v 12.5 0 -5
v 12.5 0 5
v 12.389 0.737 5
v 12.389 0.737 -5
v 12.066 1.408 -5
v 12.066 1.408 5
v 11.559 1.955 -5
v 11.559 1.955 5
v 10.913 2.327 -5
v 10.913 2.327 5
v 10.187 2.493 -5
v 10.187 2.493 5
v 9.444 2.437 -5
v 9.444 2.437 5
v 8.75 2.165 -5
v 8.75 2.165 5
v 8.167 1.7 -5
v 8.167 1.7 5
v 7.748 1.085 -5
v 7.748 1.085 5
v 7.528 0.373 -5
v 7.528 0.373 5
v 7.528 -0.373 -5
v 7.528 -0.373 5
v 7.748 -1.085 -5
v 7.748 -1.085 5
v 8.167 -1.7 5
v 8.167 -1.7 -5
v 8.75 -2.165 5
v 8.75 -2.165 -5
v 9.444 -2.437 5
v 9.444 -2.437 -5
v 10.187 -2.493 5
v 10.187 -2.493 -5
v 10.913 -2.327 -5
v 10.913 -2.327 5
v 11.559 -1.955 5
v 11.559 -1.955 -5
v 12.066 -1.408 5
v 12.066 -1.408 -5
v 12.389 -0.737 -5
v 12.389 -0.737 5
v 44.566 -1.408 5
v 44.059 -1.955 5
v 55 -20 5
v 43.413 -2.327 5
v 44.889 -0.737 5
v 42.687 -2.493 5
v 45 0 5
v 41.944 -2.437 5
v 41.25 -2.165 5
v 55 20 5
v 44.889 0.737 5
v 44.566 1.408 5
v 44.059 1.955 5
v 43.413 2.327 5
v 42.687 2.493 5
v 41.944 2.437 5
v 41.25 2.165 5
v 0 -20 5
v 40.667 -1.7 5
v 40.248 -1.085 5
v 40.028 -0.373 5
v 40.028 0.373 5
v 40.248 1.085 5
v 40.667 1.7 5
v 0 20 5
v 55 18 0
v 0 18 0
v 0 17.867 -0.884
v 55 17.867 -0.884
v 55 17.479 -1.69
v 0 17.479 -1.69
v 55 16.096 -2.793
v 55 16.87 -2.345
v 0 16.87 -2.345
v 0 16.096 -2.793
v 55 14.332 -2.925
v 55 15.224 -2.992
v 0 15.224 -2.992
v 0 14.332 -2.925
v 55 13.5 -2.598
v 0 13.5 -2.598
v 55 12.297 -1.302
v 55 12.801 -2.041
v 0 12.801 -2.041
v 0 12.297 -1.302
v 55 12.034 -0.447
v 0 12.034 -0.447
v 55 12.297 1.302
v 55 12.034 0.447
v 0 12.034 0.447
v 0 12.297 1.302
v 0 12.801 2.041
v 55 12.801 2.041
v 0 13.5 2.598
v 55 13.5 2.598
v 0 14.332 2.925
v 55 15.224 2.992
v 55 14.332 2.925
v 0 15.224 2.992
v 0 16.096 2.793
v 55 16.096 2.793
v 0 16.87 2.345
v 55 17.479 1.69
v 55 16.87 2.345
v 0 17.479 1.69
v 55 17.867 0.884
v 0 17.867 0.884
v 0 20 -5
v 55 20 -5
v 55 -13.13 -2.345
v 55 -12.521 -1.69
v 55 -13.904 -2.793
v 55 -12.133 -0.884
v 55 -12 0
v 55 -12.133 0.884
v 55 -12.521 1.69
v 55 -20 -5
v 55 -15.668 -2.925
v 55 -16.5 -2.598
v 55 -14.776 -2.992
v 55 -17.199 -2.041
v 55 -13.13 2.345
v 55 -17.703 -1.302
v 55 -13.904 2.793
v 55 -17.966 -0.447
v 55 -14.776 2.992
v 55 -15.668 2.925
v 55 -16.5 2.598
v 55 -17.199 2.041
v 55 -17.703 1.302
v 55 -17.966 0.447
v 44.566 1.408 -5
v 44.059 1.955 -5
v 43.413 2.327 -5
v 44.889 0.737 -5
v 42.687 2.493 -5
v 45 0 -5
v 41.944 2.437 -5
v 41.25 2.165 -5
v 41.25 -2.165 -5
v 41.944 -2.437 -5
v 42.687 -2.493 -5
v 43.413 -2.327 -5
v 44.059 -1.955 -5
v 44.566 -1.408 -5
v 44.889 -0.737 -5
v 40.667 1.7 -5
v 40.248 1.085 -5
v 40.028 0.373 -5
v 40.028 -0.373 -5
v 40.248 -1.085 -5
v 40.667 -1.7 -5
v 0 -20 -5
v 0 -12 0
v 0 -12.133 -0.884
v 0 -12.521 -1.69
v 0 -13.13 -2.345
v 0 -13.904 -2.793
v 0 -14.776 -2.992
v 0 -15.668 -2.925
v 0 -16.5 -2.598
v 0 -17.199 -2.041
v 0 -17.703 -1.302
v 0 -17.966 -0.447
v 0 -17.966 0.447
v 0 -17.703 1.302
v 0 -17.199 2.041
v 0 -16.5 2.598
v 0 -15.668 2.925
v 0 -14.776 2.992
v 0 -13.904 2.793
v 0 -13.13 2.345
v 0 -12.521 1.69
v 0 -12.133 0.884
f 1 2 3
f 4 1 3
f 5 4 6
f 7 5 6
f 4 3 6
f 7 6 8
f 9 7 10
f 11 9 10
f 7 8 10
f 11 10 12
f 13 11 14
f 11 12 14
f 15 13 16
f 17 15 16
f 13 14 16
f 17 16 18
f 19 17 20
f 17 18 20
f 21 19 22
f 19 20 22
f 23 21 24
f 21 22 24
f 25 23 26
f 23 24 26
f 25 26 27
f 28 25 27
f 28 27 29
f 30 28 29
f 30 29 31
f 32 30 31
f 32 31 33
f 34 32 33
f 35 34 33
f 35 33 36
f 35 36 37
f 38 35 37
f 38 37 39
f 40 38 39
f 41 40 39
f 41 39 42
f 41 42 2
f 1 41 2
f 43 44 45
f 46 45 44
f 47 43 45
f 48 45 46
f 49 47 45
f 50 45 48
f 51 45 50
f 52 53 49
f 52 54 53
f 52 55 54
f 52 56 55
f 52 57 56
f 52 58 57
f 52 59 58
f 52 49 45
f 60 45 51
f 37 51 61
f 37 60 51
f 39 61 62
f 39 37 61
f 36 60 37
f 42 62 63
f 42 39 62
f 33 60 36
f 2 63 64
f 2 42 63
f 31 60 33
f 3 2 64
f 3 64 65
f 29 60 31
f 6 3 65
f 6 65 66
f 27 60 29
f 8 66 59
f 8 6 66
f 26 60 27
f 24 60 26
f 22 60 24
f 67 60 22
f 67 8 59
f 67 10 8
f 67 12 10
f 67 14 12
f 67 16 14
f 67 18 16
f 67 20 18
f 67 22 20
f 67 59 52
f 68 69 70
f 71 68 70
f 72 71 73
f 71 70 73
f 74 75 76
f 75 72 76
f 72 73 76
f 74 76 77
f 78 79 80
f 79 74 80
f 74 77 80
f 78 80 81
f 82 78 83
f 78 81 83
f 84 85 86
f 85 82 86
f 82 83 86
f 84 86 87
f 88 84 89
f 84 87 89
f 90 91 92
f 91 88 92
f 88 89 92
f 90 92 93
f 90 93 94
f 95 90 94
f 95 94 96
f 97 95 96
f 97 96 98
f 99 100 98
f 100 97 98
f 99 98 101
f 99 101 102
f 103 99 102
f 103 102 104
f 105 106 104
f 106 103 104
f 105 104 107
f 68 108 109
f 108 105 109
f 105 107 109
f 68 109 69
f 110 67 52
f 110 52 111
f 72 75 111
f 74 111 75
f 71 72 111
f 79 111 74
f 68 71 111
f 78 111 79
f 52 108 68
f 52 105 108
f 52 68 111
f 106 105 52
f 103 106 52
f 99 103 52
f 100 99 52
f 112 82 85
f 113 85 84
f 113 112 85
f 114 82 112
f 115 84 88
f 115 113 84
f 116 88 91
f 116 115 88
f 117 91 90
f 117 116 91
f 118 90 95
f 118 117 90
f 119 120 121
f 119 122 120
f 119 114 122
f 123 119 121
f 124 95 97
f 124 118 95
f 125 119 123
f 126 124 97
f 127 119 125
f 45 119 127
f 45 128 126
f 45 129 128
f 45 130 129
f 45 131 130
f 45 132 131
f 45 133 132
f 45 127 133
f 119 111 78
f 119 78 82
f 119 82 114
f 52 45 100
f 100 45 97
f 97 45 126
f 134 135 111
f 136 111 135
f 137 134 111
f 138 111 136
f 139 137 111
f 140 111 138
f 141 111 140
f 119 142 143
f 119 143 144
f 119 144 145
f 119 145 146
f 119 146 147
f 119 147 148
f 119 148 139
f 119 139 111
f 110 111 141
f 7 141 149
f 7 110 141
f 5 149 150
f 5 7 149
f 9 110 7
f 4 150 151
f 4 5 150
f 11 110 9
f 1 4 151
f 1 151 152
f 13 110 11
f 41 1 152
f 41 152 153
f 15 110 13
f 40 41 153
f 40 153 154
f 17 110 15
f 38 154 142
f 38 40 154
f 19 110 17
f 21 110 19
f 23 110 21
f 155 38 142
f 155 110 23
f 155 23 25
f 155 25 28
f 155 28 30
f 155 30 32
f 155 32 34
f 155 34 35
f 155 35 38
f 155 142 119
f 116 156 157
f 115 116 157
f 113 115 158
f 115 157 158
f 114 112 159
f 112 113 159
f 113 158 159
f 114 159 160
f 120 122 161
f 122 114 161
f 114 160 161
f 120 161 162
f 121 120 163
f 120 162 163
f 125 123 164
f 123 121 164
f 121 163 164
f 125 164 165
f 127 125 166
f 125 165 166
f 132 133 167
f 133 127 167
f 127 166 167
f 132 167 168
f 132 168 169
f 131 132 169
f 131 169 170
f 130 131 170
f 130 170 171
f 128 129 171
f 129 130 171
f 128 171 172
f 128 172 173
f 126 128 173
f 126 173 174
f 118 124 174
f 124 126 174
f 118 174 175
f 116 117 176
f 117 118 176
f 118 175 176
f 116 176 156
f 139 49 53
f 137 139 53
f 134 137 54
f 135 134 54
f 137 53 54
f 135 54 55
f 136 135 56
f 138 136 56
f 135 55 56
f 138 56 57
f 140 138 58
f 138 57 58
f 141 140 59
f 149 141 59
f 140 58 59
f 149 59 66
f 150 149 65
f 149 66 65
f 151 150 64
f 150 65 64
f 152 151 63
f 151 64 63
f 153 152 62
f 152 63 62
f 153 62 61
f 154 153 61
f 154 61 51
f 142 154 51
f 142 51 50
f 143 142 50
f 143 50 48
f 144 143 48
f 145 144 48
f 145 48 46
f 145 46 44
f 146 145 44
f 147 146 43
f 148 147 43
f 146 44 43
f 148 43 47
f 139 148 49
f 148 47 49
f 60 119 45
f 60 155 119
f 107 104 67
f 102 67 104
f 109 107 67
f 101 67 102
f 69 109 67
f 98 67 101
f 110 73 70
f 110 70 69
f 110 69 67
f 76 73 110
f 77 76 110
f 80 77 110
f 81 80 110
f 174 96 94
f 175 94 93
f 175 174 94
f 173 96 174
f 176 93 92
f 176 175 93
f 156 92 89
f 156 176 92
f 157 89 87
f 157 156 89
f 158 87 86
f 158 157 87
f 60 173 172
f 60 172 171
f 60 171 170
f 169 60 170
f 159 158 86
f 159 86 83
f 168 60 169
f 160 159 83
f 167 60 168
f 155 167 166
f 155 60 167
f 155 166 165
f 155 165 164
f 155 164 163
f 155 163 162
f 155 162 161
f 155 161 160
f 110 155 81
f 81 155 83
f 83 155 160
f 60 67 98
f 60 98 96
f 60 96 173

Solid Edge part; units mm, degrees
sketch "Sketch1" plane through (0, 0, 0) normal (1, 0, 0) x (0, 1, 0)
  circle A0 centre (-15, 0) radius 3
  circle A1 centre (15, 0) radius 3
  line L0 (20, -5) -> (-20, -5)
  line L1 (-20, -5) -> (-20, 5)
  line L2 (-20, 5) -> (20, 5)
  line L3 (20, 5) -> (20, -5)
  dimension "D1" = 40
  dimension "D2" = 10
  dimension "D3" = 15
  dimension "D4" = 6
extrude "Protrusion1" add sketch "Sketch1" along normal blind 50
sketch "Sketch2" plane through (25, 0, 5) normal (0, 0, 1) x (1, 0, 0)
  circle A0 centre (-15, 0) radius 2.5
  circle A1 centre (17.5, 0) radius 2.5
  dimension "D1" = 5
  dimension "D2" = 5
  dimension "D3" = 10
  dimension "D4" = 32.5
extrude "Cutout1" cut sketch "Sketch2" against normal up to next
sketch "Sketch3" plane through (50, 0, 0) normal (1, 0, 0) x (0, 1, 0)
  line L0 (-20, -5) -> (20, -5)
  line L1 (20, -5) -> (20, 5)
  line L2 (20, 5) -> (-20, 5)
  line L3 (-20, 5) -> (-20, -5)
  circle A0 centre (15, 0) radius 3
  circle A1 centre (-15, 0) radius 3
extrude "ExtrudedProtrusion_4" add sketch "Sketch3" along normal blind 5
properties material "ABS Plastic, high impact"
